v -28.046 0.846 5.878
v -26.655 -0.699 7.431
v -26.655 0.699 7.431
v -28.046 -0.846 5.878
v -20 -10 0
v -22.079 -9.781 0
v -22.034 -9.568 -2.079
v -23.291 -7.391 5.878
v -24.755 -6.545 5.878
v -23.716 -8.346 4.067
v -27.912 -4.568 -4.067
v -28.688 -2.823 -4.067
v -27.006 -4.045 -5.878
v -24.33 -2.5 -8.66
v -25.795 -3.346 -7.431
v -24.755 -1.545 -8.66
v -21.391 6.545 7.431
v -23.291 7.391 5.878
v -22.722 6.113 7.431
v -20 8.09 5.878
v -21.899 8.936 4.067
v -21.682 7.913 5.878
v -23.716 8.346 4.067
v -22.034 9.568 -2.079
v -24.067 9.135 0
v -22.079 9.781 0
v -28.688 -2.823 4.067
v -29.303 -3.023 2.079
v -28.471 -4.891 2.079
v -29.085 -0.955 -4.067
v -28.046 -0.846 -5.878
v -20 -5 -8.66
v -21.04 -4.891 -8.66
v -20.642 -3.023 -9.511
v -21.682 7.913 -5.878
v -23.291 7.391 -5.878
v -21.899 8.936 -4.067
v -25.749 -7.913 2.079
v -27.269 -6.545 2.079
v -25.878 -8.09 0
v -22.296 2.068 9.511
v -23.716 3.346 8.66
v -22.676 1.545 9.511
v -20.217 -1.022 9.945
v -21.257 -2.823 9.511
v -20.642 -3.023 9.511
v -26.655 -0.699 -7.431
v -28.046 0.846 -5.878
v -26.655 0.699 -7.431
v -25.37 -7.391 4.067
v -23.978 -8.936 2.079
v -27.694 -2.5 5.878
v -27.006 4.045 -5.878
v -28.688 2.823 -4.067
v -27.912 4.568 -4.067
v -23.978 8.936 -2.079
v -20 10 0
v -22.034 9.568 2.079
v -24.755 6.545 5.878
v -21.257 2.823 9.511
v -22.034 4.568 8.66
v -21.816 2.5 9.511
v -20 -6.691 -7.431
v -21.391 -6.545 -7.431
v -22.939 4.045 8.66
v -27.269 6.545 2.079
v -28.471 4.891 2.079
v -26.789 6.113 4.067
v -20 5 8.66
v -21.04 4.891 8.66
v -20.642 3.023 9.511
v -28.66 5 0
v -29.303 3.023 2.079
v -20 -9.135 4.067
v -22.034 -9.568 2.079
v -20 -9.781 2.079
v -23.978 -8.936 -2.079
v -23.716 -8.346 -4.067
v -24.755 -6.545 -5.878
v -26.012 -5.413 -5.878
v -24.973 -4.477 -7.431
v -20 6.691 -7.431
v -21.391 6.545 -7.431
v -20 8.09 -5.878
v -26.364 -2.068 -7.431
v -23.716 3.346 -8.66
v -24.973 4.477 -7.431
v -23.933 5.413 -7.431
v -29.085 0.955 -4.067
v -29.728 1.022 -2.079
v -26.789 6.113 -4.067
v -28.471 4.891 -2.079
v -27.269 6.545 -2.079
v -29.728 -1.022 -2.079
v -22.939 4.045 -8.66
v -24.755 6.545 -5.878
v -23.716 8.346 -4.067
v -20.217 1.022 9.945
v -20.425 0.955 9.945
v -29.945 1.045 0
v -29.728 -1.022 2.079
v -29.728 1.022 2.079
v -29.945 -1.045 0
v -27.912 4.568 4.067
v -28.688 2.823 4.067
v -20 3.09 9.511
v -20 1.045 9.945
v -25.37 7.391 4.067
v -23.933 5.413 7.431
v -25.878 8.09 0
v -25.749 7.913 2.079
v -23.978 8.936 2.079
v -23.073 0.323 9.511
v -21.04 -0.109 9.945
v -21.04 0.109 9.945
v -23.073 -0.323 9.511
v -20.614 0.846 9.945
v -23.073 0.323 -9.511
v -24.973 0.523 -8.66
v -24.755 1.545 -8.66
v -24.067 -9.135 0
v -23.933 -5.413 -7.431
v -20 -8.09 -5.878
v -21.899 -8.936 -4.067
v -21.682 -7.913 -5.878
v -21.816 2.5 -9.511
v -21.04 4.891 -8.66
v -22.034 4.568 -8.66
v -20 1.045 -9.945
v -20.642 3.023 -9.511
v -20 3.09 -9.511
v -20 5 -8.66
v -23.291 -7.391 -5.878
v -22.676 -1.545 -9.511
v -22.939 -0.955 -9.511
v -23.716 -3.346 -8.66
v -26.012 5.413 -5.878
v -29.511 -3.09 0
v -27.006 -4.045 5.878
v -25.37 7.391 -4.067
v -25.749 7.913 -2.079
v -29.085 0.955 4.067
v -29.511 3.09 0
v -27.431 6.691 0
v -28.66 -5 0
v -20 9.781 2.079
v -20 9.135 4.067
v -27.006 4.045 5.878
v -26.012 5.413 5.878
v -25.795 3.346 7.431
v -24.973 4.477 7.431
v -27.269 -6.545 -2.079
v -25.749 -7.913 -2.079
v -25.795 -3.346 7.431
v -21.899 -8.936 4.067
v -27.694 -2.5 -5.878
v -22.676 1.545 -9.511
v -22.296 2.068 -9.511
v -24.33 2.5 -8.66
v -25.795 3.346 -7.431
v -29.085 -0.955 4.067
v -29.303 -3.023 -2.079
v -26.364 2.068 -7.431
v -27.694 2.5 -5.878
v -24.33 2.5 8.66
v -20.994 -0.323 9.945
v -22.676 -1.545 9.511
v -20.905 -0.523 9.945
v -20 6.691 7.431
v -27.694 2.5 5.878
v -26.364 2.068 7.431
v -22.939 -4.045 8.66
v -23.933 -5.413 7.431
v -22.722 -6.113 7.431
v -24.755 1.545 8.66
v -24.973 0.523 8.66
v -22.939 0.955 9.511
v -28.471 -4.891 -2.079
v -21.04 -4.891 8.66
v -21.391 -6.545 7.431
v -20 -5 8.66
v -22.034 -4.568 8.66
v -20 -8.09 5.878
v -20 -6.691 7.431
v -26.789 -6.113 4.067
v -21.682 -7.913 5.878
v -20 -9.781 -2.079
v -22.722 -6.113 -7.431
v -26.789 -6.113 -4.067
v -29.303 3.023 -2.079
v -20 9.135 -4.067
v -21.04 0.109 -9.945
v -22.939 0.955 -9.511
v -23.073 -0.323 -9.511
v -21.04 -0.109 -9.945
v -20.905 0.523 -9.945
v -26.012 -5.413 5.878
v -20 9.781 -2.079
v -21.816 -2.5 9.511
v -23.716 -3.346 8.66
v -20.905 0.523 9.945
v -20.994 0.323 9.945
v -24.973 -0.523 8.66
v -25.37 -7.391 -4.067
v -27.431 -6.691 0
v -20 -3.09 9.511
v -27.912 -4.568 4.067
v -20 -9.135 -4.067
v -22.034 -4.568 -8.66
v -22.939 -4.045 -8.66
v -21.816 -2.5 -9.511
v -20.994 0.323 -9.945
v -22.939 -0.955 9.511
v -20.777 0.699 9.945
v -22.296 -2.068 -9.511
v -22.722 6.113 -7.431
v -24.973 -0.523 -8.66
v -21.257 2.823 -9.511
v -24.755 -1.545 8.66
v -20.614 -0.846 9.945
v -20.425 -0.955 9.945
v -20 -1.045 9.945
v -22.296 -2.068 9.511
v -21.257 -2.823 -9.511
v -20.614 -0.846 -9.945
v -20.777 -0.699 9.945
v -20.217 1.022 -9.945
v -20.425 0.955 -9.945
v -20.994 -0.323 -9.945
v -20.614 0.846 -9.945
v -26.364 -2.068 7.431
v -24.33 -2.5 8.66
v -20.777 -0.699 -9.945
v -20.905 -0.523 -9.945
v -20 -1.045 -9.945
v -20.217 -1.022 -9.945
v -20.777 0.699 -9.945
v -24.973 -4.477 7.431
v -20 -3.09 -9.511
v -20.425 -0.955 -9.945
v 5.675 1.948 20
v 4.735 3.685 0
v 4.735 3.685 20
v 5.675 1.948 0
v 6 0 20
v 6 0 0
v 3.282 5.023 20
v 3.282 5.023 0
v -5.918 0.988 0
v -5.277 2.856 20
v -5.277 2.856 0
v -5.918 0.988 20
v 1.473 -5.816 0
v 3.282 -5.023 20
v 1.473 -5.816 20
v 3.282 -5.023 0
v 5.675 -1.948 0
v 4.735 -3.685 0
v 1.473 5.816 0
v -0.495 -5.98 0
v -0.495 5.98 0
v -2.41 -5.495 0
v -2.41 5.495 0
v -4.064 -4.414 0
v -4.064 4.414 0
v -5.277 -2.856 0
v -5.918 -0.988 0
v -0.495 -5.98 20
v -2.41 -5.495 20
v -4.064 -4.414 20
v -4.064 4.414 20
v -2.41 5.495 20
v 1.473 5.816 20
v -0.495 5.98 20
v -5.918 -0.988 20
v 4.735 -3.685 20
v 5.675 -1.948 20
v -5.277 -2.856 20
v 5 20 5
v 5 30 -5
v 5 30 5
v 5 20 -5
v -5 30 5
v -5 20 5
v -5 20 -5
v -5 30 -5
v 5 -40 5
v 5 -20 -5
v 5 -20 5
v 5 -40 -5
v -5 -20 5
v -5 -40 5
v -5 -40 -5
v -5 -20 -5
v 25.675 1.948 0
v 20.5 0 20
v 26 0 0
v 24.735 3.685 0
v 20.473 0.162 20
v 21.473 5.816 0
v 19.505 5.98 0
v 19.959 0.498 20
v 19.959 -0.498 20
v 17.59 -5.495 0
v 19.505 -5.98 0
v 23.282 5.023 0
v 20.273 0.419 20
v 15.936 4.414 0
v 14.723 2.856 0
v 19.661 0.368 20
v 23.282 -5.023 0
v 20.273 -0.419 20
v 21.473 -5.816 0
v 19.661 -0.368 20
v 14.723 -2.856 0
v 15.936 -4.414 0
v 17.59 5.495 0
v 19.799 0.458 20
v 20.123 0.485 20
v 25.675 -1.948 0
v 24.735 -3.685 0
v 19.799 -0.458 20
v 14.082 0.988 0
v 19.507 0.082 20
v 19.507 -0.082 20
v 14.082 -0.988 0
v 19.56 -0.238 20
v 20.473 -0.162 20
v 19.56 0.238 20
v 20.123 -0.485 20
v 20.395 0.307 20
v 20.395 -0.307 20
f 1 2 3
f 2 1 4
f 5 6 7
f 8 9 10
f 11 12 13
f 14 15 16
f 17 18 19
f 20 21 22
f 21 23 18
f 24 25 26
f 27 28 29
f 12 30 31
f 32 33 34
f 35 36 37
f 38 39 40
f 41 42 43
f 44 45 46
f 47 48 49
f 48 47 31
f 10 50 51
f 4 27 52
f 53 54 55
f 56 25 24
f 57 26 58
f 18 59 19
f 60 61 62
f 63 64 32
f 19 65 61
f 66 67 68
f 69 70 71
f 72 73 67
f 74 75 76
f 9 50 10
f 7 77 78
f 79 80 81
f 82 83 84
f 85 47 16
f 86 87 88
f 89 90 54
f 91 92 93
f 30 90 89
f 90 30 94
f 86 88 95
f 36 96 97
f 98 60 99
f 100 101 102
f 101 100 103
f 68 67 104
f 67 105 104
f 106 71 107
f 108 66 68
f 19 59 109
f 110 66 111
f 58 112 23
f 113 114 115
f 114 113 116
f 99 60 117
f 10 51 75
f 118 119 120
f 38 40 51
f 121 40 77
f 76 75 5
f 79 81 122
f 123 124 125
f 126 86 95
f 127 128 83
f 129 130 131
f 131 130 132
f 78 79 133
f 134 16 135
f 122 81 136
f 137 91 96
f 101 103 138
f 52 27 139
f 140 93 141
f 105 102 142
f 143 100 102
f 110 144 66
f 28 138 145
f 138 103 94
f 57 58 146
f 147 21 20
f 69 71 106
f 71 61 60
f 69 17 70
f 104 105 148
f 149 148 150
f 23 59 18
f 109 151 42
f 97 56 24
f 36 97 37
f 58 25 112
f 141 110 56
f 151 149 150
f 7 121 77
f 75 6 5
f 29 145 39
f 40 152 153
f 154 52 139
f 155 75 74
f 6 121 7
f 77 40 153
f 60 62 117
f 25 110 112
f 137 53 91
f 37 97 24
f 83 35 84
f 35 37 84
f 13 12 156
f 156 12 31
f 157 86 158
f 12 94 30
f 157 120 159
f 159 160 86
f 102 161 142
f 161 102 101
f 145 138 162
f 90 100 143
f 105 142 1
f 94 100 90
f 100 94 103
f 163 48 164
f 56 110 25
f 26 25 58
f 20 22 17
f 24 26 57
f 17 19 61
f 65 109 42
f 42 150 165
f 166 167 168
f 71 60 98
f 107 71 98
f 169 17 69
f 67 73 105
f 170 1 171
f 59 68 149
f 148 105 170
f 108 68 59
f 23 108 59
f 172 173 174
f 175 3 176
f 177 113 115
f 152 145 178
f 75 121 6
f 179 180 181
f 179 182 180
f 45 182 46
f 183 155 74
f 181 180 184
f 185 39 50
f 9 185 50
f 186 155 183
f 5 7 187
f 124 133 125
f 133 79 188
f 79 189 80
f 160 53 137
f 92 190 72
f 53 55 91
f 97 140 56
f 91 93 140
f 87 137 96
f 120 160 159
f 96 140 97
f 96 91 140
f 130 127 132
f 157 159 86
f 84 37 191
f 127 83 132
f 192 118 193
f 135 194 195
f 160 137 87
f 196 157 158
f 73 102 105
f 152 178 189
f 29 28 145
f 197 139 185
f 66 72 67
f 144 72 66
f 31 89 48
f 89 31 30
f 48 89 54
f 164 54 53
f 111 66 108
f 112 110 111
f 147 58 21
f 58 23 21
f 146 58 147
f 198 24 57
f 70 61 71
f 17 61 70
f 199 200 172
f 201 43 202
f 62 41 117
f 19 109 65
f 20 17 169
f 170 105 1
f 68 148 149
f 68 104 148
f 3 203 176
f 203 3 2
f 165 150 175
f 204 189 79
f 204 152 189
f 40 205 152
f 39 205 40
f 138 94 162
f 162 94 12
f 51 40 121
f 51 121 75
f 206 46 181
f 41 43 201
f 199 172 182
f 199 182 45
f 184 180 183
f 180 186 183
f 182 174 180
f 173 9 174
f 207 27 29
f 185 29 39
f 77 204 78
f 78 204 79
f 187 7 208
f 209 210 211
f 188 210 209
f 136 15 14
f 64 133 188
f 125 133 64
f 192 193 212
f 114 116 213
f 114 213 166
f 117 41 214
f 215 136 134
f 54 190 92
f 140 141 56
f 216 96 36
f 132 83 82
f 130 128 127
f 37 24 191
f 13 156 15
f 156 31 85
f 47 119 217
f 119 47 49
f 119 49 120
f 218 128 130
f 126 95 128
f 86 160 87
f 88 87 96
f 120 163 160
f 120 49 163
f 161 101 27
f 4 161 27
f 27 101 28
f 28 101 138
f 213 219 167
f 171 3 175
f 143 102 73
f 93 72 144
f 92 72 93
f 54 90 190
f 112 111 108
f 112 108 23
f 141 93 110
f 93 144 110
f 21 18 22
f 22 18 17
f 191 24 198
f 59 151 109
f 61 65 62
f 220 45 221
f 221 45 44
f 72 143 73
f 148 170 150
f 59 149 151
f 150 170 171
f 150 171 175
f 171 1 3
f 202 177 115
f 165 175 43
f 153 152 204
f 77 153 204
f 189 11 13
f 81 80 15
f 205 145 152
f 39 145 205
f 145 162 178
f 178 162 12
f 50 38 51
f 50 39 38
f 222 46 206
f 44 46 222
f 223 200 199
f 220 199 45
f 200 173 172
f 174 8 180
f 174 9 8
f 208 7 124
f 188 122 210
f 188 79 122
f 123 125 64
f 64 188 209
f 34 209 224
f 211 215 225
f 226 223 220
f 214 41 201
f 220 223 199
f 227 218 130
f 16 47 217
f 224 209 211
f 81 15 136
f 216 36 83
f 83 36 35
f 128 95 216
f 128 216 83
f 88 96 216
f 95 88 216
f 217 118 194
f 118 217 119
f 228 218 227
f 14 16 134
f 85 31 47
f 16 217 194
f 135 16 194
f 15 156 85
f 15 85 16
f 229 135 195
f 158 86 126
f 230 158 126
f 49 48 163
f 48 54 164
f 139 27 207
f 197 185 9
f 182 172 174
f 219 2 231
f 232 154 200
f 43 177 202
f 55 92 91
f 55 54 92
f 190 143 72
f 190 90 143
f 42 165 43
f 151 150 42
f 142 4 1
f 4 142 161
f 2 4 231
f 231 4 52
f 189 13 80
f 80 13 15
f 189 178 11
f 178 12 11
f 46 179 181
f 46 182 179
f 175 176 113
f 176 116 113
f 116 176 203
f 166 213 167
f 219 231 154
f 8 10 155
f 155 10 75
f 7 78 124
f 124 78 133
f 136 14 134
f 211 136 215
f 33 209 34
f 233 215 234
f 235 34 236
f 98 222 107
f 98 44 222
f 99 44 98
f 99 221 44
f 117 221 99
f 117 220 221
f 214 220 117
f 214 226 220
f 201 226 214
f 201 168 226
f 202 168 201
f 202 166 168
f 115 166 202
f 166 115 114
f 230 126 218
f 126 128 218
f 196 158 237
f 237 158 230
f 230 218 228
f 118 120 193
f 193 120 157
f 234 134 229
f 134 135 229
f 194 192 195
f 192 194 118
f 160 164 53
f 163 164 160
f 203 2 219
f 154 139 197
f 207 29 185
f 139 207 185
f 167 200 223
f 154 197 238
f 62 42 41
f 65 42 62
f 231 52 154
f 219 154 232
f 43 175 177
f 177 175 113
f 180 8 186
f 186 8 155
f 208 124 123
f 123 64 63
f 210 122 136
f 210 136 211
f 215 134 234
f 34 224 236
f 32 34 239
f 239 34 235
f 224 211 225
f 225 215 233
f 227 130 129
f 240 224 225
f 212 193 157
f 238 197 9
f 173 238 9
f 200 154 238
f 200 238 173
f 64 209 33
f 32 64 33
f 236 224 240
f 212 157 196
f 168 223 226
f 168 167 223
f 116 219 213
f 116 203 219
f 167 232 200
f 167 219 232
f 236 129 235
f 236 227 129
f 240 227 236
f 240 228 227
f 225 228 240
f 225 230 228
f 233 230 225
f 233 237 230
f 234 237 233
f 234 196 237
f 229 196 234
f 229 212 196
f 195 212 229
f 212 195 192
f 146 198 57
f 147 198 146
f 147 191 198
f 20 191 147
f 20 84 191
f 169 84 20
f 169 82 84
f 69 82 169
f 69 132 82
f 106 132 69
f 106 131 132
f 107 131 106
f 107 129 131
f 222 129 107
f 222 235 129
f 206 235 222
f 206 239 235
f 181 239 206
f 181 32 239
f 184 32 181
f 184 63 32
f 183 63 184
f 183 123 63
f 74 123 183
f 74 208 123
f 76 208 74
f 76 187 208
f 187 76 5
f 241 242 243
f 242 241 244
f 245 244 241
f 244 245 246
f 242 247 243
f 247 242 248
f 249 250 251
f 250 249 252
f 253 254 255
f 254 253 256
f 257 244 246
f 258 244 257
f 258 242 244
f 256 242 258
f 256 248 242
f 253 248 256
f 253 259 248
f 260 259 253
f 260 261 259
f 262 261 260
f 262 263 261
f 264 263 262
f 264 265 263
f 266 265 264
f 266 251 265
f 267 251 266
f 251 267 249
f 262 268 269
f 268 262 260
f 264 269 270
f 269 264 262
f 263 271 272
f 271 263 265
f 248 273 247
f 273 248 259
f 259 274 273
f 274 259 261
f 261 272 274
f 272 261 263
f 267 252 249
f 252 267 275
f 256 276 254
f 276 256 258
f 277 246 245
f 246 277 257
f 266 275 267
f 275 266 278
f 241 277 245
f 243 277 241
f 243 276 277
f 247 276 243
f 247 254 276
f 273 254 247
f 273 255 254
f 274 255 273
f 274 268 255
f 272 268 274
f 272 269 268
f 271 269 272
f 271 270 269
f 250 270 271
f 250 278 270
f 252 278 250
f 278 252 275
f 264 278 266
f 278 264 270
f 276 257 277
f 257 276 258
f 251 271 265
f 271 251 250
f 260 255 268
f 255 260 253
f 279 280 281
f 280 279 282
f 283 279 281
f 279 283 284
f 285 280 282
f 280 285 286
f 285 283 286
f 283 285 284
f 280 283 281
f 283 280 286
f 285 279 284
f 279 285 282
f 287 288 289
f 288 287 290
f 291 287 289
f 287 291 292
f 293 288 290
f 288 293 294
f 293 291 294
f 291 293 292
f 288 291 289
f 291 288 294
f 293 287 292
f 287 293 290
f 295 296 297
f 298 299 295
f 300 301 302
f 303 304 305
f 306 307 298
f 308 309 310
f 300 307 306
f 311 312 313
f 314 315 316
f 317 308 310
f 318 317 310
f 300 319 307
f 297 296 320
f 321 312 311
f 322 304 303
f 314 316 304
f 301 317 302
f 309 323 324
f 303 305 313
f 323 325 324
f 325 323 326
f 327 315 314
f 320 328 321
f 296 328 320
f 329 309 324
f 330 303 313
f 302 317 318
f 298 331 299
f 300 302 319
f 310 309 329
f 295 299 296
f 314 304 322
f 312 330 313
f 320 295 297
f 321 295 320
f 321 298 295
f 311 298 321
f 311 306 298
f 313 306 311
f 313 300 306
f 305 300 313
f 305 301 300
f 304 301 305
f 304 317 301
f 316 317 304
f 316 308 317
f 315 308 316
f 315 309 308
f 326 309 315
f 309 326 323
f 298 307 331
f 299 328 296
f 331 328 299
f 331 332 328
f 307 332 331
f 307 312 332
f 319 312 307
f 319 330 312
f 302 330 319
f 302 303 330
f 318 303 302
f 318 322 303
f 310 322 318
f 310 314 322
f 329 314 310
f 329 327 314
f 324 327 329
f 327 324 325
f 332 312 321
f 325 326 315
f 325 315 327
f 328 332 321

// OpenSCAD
/*five building blocks: cube, hemisphere, cylinder, rectangular prism, cone */

//cylinder
color("DarkRed") cylinder(h=20, r1=6, r2=6, center = false);

//cube
color("MidnightBlue")
    translate([0,25,0]) scale([1,1,1]) cube(10, center=true);
    
//rectangular prism
color("DarkGreen")
    translate([0,-30,0]) scale([0.5,1,0.5]) cube(20, center=true);
    
//cone
color("Gold") 
    translate ([20,0,0])
    cylinder(h=20, r1=6, r2=0.5, center = false);
 
//hemisphere
color("Orange")
difference() {
  translate ([-20,0,0])
    rotate(90)
    sphere(10);
  translate([-10,0,0]) cube(20, center=true);
  rotate(90);
}
